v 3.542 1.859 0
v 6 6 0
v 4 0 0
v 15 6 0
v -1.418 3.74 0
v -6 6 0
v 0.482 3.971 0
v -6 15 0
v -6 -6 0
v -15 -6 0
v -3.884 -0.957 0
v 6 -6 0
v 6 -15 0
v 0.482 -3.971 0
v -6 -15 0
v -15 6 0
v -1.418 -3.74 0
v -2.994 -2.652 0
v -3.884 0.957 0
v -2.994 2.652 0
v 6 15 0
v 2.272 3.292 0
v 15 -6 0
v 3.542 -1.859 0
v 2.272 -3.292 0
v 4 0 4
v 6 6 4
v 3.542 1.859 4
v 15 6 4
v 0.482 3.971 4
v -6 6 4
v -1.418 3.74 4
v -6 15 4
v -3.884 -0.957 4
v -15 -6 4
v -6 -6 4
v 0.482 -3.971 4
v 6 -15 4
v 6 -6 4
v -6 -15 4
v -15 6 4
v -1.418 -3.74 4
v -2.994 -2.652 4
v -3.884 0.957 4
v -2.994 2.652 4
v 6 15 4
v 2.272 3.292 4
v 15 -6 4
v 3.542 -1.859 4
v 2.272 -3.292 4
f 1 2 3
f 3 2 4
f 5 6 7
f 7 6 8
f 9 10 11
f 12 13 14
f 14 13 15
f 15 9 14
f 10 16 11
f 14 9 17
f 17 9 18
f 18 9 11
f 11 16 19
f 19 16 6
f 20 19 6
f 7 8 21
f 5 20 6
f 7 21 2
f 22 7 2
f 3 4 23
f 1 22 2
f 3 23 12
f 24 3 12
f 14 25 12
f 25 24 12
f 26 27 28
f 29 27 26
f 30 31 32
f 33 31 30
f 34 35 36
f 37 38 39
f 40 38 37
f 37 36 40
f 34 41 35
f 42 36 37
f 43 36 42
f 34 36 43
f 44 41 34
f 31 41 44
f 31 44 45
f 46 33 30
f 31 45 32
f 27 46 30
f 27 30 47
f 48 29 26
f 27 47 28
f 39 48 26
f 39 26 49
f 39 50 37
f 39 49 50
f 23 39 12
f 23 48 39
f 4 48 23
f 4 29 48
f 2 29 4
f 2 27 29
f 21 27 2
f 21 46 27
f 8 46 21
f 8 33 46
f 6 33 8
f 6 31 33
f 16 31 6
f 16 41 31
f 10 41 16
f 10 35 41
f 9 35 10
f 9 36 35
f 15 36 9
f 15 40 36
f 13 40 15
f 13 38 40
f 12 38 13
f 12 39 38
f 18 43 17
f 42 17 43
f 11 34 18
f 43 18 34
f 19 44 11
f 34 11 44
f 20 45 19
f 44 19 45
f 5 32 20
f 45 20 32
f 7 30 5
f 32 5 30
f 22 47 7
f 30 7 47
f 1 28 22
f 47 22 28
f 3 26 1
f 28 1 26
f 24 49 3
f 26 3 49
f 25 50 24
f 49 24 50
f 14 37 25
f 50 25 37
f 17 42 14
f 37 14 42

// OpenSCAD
// 2D union/difference/intersection combined, then extruded.
linear_extrude(4)
difference() {
    union() {
        square([30, 12], center = true);
        rotate(90) square([30, 12], center = true);   // a plus sign
    }
    circle(4);                                          // hole through the middle
}
